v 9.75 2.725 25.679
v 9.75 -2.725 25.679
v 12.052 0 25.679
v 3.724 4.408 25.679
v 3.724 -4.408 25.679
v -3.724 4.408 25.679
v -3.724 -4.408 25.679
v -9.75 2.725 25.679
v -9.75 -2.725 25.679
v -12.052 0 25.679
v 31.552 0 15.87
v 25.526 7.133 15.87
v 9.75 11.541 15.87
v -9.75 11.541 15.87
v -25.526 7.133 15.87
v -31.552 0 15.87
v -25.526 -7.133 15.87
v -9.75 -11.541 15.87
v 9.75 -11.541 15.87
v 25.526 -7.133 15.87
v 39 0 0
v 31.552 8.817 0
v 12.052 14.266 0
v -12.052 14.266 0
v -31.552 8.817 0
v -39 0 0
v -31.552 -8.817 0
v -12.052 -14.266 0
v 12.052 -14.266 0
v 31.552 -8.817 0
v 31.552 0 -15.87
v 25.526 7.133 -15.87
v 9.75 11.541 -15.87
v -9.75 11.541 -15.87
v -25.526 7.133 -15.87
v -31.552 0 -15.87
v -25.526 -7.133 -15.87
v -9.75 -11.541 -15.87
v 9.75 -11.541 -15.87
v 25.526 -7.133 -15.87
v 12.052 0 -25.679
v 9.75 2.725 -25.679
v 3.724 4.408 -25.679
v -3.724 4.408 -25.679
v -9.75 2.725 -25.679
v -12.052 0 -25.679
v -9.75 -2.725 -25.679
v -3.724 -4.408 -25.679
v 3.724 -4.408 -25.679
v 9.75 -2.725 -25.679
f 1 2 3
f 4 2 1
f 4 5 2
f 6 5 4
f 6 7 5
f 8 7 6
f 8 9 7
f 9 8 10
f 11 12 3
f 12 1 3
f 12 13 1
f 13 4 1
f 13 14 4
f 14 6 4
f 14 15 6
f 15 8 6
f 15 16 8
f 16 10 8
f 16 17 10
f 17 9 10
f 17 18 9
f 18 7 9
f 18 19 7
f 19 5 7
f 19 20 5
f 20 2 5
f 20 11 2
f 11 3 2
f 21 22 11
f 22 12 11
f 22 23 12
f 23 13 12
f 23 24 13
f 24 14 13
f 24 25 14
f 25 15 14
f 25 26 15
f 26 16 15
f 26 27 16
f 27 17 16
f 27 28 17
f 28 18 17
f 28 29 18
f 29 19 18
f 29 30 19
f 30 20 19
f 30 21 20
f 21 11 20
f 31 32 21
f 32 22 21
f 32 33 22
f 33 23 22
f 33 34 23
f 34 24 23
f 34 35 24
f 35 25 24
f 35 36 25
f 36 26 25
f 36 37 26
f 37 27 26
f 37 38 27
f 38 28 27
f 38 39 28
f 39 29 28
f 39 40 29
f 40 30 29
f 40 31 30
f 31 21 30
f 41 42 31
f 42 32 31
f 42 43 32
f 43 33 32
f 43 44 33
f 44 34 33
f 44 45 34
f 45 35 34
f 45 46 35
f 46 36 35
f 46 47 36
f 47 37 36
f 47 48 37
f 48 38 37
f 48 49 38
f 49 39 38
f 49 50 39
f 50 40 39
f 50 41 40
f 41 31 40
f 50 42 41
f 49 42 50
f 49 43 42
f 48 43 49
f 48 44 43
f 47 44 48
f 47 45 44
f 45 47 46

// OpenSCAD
// Generated by SolidPython 1.0.1 on 2020-07-29 00:46:50


scale(v = [13, 5, 9]) {
	sphere(r = 3);
}
/***********************************************
*********      SolidPython code:      **********
************************************************
 
# import packages: SolidPython
from solid import *
from solid.utils import *
from itertools import chain, combinations, permutations


class Resize:

    def __init__(self, scad_file):
        self.scad_file = scad_file
        #self.scad_file = import_scad(scad_file)
        # cone/cylinder param:
        self.r1 = 0
        self.r2 = 0
        self.h = 0
        # rectangular prism param:
        self.w = 0
        self.l = 0
        # ellipse param:
        self.r = 0

    # import OpenScad code (file name corresponds to shape)


    # classify shape + parameters
    def assign(self, param1, param2, param3):
        if self.scad_file == 'cone.scad':
            self.r1 = param1
            self.r2 = param2
            self.h = param3
        elif self.scad_file == 'cylinder.scad':
            self.r1 = param1
            self.r2 = param2
            self.h = param3
        elif self.scad_file == 'rectangularPrism.scad':
            self.h = param1
            self.l = param2
            self.w = param3
        else:
            self.r = param1
            self.h = param2

    # resize parameters
    def iterate(self):
        x = range(3, 20, 2)
        i = 1
        if self.scad_file == 'cone.scad':
            tempList = list(permutations(x, 2))
            for temp in tempList:
                param1 = temp[0]
                param2 = temp[1]
                filepath = 'produced_scad_files/' + 'cone' + str(param1) + '_' + str(param2) + '_' + '.scad'
                scad_render_to_file(cylinder(h=param1, r1=param2, r2=0), filepath)

        elif self.scad_file == 'cylinder.scad':
            tempList = list(permutations(x, 3))
            for temp in tempList:
                param1 = temp[0]
                param2 = temp[1]
                filepath = 'produced_scad_files/' + 'cylinder' + str(param1) + '_' + str(param2) + '_' + '.scad'
                scad_render_to_file(cylinder(h=param1, r1=param2, r2=param2), filepath)

        elif self.scad_file == 'rectangularPrism.scad':
            tempList = list(permutations(x, 3))
            for temp in tempList:
                param1 = temp[0]
                param2 = temp[1]
                param3 = temp[2]
                filepath = 'produced_scad_files/' + 'rectangularPrism' + str(param1) + '_' + str(param2) + '_' + str(
                    param3) + '.scad'
                scad_render_to_file(cube(size=(param1, param2, param3)), filepath)

        elif self.scad_file == 'ellipse.scad':
            tempList = list(permutations(x, 4))
            for temp in tempList:
                param1 = temp[0]
                param2 = temp[1]
                param3 = temp[2]
                param4 = temp[3]
                filepath = 'produced_scad_files/' + 'ellipse' + str(param1) + '_' + str(param2) + '_' + str(param3) + '_' + str(param4) + '.scad'
                scad_render_to_file(scale([param1, param2, param3])(sphere(r=param4)), filepath)

    def render_to_scadfile(self):
        scad_render_to_file(scad, 'example.scad') 
 
************************************************/
